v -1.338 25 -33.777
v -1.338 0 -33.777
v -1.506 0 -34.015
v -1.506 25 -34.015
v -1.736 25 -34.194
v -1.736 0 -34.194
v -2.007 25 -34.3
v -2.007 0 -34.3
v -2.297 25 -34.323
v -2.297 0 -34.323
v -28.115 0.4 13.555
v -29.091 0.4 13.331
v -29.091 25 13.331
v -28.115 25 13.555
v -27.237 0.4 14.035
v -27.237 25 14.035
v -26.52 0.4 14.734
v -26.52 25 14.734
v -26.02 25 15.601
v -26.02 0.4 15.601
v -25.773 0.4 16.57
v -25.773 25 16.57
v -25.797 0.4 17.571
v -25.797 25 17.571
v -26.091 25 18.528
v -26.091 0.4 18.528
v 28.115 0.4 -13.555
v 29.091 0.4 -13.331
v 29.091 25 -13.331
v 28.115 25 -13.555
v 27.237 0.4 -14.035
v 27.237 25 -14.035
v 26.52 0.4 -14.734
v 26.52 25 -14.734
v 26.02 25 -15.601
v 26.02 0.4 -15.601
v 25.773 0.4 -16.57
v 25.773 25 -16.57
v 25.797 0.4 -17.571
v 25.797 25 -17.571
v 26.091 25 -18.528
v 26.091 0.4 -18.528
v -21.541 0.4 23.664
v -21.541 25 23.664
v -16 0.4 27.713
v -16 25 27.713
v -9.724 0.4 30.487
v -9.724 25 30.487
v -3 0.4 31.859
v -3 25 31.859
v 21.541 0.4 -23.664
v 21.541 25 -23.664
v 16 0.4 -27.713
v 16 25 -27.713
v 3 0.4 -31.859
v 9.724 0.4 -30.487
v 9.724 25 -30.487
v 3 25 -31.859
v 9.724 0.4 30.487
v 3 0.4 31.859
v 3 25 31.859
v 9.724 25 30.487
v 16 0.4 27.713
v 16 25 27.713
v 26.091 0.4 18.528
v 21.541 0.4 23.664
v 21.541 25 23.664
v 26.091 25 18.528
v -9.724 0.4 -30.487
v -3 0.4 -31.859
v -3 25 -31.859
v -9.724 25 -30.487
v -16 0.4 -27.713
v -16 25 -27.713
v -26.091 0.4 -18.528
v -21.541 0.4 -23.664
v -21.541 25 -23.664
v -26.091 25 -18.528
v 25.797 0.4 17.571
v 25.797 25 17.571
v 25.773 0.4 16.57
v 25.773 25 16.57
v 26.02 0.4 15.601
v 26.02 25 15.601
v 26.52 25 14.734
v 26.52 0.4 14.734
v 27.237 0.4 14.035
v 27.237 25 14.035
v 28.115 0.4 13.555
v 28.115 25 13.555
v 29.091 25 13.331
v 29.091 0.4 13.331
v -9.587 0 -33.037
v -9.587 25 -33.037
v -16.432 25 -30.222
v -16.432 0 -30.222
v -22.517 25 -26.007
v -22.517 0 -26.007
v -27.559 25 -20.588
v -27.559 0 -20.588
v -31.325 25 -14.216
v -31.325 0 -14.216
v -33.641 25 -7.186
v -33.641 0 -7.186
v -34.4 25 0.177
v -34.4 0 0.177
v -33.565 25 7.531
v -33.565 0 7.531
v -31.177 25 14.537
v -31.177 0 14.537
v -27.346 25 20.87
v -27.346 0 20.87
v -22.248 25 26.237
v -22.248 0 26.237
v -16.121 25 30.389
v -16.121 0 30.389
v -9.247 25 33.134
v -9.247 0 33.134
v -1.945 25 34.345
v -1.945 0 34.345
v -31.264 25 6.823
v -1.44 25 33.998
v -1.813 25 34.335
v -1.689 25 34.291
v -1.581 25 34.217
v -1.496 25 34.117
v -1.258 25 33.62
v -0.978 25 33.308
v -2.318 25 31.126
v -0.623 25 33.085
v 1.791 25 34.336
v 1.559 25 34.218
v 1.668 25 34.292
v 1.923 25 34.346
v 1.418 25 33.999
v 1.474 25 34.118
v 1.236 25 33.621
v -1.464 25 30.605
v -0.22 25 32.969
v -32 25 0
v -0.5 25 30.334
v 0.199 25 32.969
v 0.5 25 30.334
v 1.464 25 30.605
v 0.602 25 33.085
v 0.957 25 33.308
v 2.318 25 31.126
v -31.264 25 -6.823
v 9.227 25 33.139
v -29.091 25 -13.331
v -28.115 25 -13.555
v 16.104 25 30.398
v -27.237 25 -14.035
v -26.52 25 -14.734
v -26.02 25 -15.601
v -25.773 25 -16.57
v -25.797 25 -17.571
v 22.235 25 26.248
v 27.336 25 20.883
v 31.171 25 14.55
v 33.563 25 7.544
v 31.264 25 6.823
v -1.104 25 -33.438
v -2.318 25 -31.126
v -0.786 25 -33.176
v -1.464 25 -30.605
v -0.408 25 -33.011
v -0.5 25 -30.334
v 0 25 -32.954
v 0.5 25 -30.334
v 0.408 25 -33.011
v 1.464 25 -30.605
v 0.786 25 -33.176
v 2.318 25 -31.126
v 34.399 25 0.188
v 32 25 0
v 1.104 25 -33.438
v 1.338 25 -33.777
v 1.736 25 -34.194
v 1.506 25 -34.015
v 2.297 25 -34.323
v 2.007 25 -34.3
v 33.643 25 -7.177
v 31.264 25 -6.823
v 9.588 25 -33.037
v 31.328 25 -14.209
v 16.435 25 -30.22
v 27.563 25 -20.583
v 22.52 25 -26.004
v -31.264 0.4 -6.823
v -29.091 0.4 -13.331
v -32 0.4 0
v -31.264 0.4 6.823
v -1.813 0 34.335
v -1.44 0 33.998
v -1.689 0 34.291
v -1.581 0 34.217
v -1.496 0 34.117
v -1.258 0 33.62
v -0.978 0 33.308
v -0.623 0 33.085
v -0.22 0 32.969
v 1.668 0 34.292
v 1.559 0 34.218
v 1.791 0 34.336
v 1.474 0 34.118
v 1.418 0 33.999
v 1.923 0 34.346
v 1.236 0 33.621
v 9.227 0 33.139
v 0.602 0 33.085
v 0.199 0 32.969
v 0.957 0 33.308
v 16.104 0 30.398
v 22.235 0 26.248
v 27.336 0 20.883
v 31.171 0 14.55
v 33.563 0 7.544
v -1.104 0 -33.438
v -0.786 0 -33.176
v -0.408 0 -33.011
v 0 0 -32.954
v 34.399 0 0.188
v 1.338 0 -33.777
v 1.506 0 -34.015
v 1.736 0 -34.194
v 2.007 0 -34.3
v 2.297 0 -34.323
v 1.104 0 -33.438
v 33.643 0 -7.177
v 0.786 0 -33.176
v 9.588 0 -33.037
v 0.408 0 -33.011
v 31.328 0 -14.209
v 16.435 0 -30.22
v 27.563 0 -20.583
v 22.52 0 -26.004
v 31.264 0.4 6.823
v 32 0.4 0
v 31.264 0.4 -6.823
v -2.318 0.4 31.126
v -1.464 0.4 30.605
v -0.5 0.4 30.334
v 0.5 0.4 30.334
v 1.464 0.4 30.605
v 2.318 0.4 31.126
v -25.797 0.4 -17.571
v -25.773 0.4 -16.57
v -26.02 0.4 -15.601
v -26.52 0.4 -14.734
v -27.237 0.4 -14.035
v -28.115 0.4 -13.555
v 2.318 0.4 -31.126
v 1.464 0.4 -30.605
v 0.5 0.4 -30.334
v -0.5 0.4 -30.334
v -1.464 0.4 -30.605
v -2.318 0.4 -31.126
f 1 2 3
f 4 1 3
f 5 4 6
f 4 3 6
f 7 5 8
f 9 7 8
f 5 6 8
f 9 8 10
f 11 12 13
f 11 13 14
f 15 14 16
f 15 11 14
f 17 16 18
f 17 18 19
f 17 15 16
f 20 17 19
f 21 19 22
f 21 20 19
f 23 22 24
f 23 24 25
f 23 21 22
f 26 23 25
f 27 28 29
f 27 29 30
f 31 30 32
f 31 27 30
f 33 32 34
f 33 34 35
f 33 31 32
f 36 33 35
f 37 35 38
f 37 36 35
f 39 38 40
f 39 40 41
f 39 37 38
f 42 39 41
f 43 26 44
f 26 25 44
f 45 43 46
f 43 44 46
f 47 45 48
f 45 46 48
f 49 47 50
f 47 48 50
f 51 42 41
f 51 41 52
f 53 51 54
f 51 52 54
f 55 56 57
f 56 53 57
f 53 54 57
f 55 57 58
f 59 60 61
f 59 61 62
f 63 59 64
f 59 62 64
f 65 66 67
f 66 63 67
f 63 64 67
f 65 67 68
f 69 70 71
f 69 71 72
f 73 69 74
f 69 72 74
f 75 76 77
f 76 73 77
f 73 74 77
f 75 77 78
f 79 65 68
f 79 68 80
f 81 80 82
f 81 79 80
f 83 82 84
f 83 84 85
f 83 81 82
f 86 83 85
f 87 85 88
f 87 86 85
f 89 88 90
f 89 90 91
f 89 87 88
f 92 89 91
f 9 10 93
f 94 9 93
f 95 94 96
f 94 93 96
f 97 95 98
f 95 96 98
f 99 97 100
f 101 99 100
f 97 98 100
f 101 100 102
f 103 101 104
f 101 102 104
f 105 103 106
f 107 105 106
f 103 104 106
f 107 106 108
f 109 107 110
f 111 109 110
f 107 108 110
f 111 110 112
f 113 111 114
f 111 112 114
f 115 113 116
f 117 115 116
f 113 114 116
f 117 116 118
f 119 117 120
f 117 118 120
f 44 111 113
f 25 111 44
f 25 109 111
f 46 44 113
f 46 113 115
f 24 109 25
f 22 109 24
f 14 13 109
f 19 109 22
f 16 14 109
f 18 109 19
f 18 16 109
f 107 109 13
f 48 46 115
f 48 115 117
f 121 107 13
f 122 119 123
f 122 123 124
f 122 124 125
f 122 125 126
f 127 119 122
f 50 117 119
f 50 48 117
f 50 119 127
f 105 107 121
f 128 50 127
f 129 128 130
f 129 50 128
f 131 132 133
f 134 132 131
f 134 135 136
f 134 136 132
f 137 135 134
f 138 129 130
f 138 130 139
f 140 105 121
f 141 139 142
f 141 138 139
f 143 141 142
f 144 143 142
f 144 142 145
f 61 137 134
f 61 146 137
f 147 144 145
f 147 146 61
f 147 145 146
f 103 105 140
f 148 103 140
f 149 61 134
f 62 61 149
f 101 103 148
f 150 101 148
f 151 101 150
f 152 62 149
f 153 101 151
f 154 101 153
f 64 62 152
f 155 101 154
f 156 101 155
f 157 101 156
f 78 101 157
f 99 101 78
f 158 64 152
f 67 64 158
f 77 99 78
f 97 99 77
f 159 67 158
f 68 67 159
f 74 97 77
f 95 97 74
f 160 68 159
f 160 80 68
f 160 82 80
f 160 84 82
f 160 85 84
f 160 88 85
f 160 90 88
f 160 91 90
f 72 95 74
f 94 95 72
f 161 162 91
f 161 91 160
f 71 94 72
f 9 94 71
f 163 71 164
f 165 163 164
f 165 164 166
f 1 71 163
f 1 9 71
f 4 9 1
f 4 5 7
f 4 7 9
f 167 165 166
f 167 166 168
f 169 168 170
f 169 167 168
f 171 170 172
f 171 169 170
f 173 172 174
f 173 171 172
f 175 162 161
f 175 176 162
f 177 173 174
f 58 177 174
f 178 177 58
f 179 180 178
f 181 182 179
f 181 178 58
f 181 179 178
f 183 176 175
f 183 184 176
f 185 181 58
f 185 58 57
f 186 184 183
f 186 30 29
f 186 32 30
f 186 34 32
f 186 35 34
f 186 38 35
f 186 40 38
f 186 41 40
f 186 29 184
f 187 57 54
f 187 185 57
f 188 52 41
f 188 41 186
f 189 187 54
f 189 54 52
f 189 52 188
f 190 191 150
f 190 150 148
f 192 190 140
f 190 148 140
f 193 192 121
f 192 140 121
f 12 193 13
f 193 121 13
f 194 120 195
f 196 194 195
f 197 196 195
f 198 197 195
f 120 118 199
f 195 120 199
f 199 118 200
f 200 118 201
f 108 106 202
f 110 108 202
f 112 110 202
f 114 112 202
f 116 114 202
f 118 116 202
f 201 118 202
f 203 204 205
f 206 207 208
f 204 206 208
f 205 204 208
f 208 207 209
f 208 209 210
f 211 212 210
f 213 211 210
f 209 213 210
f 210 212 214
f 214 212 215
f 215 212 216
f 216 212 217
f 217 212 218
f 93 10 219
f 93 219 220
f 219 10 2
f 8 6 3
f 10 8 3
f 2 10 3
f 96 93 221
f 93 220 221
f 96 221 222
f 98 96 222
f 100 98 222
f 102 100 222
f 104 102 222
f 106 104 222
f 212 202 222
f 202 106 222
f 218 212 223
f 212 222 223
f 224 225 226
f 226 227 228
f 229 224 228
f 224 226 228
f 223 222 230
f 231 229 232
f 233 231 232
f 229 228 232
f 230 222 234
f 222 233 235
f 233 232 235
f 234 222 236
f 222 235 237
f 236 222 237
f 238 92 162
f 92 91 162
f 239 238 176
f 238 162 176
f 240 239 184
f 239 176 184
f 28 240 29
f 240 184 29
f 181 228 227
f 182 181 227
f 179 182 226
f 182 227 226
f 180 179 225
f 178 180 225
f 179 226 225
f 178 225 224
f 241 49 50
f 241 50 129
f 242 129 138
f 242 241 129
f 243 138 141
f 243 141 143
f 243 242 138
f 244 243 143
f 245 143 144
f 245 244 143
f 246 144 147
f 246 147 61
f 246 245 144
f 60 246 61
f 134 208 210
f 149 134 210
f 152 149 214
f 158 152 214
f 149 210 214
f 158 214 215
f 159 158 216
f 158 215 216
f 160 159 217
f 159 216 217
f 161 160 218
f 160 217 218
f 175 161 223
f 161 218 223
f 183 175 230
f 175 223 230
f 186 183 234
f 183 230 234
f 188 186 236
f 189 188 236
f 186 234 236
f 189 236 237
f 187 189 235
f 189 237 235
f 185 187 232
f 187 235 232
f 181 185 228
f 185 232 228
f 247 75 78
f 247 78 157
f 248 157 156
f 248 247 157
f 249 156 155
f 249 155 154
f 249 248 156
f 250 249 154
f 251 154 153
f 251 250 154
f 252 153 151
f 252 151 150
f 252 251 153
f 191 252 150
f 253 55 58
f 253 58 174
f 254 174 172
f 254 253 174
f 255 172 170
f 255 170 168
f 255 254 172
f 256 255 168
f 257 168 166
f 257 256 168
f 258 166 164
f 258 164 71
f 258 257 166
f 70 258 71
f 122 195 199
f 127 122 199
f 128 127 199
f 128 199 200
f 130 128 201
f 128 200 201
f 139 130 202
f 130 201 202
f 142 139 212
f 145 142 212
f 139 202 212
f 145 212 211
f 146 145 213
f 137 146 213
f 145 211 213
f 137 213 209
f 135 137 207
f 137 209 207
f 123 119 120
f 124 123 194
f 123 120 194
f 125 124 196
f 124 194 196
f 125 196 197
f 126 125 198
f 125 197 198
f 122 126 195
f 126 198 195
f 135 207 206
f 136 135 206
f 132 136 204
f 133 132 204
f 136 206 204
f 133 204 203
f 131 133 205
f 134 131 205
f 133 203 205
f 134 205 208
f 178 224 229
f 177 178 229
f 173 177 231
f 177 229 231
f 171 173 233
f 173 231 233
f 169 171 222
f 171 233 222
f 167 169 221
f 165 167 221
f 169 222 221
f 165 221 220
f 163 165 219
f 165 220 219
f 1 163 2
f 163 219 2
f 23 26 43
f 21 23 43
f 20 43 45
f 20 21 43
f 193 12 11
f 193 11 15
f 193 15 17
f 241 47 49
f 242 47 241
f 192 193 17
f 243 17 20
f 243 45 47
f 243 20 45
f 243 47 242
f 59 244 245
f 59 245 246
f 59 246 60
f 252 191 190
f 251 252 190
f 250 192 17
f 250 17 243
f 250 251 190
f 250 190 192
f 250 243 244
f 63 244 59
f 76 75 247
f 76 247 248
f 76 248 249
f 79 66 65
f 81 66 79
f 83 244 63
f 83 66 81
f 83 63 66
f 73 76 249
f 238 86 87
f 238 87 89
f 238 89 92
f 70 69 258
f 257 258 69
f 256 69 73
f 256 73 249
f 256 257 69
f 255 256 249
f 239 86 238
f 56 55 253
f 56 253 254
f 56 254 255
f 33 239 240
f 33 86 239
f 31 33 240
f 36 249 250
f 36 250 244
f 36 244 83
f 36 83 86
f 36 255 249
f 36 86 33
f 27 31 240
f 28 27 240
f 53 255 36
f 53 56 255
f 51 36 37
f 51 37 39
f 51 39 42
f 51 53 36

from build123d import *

# Parameters (mm, degrees)
BOSS_EXTRUDE1_DEPTH = 25
BOSS_EXTRUDE2_DEPTH = 25
SKETCH6_R           = 32
CUT_EXTRUDE2_DEPTH  = 24.6
BOSS_EXTRUDE5_DEPTH = 24.6
CIRPATTERN1_COUNT   = 6


with BuildPart() as part:
    # Sketch1 → Boss-Extrude1 (new body)
    with BuildSketch(Plane(origin=(0, 0, 0), x_dir=(1, 0, 0), z_dir=(0, 1, 0))):
        with BuildLine():
            ThreePointArc((1.418185365, -33.998799682), (1.610940688, -34.258772233), (1.922534331, -34.346235045))
            ThreePointArc((1.922534331, -34.346235045), (34.399487229, -0.187825316), (2.297477624, 34.323193275))
            ThreePointArc((2.297477624, 34.323193275), (1.735753357, 34.194354817), (1.33841429, 33.776916))
            ThreePointArc((1.33841429, 33.776916), (0, 32.954150957), (-1.33841429, 33.776916))
            ThreePointArc((-1.33841429, 33.776916), (-1.735753357, 34.194354817), (-2.297477624, 34.323193275))
            ThreePointArc((-2.297477624, 34.323193275), (-34.399545597, -0.176812713), (-1.944525024, -34.344997051))
            ThreePointArc((-1.944525024, -34.344997051), (-1.632875445, -34.257733763), (-1.439953708, -33.997884682))
            ThreePointArc((-1.439953708, -33.997884682), (-0.010549885, -32.954149268), (1.418185365, -33.998799682))
        make_face()
        with BuildLine():
            Line((-2.417, 3.18717916), (0, 3.18717916))
            Line((0, 3.18717916), (2.417, 3.18717916))
            ThreePointArc((2.417, 3.18717916), (0, -4), (-2.417, 3.18717916))
        make_face(mode=Mode.SUBTRACT)
    extrude(amount=BOSS_EXTRUDE1_DEPTH)

    # Sketch5 → Boss-Extrude2 (add)
    with BuildSketch(Plane.XZ):
        with BuildLine():
            Line((-2.732678298, -4.18717916), (0, -4.18717916))
            Line((0, -4.18717916), (2.732678298, -4.18717916))
            ThreePointArc((2.732678298, -4.18717916), (0, 5), (-2.732678298, -4.18717916))
        make_face()
    extrude(amount=-BOSS_EXTRUDE2_DEPTH)

    # Sketch6 → Cut-Extrude2 (cut)
    with BuildSketch(Plane(origin=(0, 25, 0), x_dir=(1, 0, 0), z_dir=(0, 1, 0))):
        Circle(SKETCH6_R)
    extrude(amount=-CUT_EXTRUDE2_DEPTH, mode=Mode.SUBTRACT)

    # Sketch8 → Boss-Extrude5 (add)
    with BuildSketch(Plane(origin=(0, 0.4, 0), x_dir=(1, 0, 0), z_dir=(0, 1, 0))):
        with BuildLine():
            ThreePointArc((3, 31.859064644), (0, 30.3), (-3, 31.859064644))
            ThreePointArc((-3, 31.859064644), (0, 32), (3, 31.859064644))
        make_face()
    boss_extrude5 = extrude(amount=BOSS_EXTRUDE5_DEPTH)

    # CirPattern1: Boss-Extrude5 ×6 about axis
    cirpattern1_axis = Axis((0, 0, 0), (0, 1, 0))
    for i in range(1, CIRPATTERN1_COUNT):
        add(boss_extrude5.rotate(cirpattern1_axis, i * 360 / CIRPATTERN1_COUNT))


solid = part.part
